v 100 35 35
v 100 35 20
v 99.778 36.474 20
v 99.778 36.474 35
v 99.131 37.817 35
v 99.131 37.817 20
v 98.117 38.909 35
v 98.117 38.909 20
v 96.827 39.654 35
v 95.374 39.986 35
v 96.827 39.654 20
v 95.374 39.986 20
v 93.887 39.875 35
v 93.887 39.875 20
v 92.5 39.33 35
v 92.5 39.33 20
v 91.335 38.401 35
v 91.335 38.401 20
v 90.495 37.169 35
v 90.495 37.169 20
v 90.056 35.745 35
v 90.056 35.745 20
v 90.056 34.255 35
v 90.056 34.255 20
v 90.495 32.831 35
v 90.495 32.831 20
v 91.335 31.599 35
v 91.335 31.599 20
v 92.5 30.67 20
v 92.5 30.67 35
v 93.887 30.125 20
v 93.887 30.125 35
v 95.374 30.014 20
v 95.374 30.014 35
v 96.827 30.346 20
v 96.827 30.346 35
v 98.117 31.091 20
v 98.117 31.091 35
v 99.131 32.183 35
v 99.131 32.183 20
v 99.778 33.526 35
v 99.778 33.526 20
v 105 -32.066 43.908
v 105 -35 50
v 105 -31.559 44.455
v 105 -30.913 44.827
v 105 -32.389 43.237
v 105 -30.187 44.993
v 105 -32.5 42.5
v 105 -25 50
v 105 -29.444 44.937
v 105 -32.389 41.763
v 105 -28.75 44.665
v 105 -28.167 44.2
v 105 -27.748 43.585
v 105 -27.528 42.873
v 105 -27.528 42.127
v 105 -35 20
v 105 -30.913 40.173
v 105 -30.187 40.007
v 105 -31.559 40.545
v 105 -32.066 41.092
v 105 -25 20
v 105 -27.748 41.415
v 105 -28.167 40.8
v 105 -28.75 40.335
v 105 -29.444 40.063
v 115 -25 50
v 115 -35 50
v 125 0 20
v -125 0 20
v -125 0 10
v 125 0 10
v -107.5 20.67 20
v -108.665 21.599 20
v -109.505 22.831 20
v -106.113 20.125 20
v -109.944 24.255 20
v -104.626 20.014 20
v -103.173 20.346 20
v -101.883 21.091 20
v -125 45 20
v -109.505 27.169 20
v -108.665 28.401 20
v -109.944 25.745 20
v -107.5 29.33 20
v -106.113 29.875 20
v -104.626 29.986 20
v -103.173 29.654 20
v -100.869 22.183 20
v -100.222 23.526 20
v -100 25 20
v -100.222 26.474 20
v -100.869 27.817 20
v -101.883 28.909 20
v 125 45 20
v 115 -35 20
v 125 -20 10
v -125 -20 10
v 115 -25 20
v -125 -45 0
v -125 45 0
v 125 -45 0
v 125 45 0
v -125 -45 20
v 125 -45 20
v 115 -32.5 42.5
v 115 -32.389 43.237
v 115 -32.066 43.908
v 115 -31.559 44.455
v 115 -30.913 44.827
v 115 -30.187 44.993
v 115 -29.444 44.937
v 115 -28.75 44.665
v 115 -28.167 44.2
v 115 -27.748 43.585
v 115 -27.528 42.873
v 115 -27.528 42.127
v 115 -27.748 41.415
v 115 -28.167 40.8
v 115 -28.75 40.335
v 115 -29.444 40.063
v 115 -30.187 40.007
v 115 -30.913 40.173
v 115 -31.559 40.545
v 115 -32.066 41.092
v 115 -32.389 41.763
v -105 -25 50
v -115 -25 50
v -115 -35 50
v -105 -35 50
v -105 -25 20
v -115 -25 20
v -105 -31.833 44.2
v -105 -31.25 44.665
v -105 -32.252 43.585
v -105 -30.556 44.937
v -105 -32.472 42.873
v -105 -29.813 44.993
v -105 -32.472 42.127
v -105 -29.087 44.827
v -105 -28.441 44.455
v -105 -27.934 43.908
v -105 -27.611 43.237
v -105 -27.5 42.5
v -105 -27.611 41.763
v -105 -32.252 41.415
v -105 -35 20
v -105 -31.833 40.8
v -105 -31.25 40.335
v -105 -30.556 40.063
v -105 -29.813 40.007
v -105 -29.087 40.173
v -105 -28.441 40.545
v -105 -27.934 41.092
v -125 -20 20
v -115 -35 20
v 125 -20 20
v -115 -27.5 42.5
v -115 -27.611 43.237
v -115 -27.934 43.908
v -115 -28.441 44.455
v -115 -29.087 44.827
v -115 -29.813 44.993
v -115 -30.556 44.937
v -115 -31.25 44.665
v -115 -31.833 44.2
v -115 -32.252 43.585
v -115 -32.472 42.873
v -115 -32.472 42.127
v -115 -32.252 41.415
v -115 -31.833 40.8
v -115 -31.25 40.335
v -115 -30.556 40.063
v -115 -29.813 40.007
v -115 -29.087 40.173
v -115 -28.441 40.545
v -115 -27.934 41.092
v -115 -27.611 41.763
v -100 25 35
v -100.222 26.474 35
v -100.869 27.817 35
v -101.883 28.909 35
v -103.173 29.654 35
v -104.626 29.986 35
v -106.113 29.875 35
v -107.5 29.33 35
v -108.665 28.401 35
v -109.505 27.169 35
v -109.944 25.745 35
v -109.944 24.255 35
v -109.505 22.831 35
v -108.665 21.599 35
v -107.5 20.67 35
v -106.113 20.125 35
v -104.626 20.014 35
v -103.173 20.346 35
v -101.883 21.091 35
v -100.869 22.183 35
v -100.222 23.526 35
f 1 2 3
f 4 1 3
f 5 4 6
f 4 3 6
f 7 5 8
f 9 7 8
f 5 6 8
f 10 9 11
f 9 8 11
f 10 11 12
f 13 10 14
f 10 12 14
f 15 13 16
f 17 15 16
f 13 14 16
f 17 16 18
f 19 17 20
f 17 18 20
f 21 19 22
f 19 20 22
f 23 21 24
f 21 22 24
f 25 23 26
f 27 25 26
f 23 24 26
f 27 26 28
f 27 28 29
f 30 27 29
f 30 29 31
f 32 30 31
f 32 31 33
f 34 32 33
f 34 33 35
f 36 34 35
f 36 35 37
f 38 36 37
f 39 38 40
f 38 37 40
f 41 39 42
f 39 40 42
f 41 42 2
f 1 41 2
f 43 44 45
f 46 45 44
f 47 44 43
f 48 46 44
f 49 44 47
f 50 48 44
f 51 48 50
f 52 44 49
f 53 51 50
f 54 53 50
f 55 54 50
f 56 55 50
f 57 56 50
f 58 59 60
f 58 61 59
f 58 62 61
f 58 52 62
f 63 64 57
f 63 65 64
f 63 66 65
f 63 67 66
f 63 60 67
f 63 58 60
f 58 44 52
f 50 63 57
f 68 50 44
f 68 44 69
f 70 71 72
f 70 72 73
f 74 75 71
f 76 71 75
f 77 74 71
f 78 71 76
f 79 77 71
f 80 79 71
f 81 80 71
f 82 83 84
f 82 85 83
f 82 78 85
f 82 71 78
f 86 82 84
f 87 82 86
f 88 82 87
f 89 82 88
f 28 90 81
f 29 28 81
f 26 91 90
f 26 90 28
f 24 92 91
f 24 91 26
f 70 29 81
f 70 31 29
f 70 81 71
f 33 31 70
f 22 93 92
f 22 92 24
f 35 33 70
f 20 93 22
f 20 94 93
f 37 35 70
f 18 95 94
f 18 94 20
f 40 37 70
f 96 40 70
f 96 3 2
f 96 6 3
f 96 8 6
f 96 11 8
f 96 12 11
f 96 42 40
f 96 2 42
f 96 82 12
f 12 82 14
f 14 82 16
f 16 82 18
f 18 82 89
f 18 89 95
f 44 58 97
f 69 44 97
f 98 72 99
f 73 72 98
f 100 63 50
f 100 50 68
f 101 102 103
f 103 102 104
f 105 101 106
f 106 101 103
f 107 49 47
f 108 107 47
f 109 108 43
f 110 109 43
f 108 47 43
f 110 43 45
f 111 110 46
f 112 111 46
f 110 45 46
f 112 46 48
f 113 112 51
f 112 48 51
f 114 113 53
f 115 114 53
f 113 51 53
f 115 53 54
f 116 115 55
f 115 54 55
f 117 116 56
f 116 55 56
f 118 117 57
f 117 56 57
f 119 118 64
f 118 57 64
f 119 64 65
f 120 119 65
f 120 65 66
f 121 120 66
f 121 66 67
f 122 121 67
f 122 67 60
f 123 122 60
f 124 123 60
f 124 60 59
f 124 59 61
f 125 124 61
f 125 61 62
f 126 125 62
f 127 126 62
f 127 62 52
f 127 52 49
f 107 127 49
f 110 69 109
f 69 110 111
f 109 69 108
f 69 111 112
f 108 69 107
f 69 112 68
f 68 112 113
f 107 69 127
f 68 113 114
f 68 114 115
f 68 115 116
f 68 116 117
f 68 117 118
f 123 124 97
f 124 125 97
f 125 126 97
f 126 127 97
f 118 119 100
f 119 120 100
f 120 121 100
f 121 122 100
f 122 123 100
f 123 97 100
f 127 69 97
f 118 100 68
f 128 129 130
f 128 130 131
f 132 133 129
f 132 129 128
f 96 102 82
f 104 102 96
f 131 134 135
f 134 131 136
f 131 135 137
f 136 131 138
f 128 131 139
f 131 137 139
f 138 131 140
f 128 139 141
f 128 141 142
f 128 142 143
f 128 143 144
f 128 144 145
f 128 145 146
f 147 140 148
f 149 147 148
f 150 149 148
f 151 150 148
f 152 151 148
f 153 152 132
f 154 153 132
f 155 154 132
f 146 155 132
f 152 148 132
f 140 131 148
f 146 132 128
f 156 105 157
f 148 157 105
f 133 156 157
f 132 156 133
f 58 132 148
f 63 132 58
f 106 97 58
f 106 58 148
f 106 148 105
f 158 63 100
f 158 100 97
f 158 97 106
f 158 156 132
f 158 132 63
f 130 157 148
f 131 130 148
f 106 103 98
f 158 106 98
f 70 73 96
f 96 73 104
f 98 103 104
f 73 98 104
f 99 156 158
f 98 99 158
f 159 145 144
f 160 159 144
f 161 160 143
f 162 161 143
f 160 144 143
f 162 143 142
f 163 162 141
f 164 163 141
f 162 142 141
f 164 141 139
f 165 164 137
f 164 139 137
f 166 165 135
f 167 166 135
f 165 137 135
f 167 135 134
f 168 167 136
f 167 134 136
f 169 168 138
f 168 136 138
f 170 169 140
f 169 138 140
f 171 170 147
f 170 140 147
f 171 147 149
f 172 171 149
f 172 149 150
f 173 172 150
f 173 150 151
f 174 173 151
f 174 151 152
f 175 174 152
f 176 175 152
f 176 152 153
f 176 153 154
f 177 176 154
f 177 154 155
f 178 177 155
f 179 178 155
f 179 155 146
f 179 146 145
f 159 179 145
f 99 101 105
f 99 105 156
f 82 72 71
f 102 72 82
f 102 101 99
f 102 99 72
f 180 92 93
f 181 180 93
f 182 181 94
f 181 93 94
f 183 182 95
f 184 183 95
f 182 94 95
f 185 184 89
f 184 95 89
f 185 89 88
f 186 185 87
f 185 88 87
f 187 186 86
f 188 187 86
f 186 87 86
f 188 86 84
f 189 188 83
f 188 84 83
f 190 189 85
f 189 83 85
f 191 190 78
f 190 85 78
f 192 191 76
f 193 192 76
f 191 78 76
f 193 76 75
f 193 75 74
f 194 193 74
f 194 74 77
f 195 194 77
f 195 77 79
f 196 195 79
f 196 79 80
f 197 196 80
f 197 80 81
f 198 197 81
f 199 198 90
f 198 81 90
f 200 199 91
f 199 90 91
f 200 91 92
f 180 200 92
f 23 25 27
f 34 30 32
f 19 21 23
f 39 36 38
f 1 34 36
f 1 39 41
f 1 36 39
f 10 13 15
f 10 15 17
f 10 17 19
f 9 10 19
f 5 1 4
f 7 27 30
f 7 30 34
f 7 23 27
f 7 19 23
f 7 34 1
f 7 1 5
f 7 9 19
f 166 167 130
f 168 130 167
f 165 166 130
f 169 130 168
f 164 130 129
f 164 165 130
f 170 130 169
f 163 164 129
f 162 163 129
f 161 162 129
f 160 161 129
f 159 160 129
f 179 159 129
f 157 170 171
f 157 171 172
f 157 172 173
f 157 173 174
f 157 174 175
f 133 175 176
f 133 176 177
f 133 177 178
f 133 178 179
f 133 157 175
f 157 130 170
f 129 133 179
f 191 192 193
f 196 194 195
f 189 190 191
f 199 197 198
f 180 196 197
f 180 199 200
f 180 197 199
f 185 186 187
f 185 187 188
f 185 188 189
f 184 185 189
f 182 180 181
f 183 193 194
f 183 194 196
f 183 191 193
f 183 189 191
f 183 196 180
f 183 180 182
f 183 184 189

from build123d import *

# Parameters (mm, degrees)
F0_W      = 250
F0_H      = 90
F1_DEPTH  = 20
F2_R      = 5
F3_DEPTH  = 15
F4_W      = 250
F4_H      = 20
F5_DEPTH  = 10
F6_W      = 10
F6_H      = 10
F7_DEPTH  = 30
F8_R      = 2.5
F9_DEPTH  = 20.001
F10_R     = 2.5
F11_DEPTH = 20.001


with BuildPart() as f1:
    # F0 (on Top) → F1 (new body)
    with BuildSketch(Plane.XY):
        Rectangle(F0_W, F0_H)
    extrude(amount=F1_DEPTH)

    # F2 (on face) → F3 (join)
    with BuildSketch(Plane.XY.offset(20)):
        with Locations((95, 35)):
            Circle(F2_R)
        with Locations((-105, 25)):
            Circle(F2_R)
    extrude(amount=F3_DEPTH)

    # F4 (on face) → F5 (cut)
    with BuildSketch(Plane.XY.offset(20)):
        with Locations((0, -10)):
            Rectangle(F4_W, F4_H)
    extrude(amount=-F5_DEPTH, mode=Mode.SUBTRACT)

    # F6 (on face) → F7 (join)
    with BuildSketch(Plane.XY.offset(20)):
        with Locations((-110, -30)):
            Rectangle(F6_W, F6_H)
        with Locations((110, -30)):
            Rectangle(F6_W, F6_H)
    extrude(amount=F7_DEPTH)

    # F8 (on face) → F9 (cut, through all)
    with BuildSketch(Plane.YZ.offset(-105)):
        with Locations((-30, 42.5)):
            Circle(F8_R)
    extrude(amount=-F9_DEPTH, mode=Mode.SUBTRACT)

    # F10 (on face) → F11 (cut, through all)
    with BuildSketch(Plane(origin=(105, 0, 0), x_dir=(0, -1, 0), z_dir=(-1, 0, 0))):
        with Locations((30, 42.5)):
            Circle(F10_R)
    extrude(amount=-F11_DEPTH, mode=Mode.SUBTRACT)


solid = f1.part
